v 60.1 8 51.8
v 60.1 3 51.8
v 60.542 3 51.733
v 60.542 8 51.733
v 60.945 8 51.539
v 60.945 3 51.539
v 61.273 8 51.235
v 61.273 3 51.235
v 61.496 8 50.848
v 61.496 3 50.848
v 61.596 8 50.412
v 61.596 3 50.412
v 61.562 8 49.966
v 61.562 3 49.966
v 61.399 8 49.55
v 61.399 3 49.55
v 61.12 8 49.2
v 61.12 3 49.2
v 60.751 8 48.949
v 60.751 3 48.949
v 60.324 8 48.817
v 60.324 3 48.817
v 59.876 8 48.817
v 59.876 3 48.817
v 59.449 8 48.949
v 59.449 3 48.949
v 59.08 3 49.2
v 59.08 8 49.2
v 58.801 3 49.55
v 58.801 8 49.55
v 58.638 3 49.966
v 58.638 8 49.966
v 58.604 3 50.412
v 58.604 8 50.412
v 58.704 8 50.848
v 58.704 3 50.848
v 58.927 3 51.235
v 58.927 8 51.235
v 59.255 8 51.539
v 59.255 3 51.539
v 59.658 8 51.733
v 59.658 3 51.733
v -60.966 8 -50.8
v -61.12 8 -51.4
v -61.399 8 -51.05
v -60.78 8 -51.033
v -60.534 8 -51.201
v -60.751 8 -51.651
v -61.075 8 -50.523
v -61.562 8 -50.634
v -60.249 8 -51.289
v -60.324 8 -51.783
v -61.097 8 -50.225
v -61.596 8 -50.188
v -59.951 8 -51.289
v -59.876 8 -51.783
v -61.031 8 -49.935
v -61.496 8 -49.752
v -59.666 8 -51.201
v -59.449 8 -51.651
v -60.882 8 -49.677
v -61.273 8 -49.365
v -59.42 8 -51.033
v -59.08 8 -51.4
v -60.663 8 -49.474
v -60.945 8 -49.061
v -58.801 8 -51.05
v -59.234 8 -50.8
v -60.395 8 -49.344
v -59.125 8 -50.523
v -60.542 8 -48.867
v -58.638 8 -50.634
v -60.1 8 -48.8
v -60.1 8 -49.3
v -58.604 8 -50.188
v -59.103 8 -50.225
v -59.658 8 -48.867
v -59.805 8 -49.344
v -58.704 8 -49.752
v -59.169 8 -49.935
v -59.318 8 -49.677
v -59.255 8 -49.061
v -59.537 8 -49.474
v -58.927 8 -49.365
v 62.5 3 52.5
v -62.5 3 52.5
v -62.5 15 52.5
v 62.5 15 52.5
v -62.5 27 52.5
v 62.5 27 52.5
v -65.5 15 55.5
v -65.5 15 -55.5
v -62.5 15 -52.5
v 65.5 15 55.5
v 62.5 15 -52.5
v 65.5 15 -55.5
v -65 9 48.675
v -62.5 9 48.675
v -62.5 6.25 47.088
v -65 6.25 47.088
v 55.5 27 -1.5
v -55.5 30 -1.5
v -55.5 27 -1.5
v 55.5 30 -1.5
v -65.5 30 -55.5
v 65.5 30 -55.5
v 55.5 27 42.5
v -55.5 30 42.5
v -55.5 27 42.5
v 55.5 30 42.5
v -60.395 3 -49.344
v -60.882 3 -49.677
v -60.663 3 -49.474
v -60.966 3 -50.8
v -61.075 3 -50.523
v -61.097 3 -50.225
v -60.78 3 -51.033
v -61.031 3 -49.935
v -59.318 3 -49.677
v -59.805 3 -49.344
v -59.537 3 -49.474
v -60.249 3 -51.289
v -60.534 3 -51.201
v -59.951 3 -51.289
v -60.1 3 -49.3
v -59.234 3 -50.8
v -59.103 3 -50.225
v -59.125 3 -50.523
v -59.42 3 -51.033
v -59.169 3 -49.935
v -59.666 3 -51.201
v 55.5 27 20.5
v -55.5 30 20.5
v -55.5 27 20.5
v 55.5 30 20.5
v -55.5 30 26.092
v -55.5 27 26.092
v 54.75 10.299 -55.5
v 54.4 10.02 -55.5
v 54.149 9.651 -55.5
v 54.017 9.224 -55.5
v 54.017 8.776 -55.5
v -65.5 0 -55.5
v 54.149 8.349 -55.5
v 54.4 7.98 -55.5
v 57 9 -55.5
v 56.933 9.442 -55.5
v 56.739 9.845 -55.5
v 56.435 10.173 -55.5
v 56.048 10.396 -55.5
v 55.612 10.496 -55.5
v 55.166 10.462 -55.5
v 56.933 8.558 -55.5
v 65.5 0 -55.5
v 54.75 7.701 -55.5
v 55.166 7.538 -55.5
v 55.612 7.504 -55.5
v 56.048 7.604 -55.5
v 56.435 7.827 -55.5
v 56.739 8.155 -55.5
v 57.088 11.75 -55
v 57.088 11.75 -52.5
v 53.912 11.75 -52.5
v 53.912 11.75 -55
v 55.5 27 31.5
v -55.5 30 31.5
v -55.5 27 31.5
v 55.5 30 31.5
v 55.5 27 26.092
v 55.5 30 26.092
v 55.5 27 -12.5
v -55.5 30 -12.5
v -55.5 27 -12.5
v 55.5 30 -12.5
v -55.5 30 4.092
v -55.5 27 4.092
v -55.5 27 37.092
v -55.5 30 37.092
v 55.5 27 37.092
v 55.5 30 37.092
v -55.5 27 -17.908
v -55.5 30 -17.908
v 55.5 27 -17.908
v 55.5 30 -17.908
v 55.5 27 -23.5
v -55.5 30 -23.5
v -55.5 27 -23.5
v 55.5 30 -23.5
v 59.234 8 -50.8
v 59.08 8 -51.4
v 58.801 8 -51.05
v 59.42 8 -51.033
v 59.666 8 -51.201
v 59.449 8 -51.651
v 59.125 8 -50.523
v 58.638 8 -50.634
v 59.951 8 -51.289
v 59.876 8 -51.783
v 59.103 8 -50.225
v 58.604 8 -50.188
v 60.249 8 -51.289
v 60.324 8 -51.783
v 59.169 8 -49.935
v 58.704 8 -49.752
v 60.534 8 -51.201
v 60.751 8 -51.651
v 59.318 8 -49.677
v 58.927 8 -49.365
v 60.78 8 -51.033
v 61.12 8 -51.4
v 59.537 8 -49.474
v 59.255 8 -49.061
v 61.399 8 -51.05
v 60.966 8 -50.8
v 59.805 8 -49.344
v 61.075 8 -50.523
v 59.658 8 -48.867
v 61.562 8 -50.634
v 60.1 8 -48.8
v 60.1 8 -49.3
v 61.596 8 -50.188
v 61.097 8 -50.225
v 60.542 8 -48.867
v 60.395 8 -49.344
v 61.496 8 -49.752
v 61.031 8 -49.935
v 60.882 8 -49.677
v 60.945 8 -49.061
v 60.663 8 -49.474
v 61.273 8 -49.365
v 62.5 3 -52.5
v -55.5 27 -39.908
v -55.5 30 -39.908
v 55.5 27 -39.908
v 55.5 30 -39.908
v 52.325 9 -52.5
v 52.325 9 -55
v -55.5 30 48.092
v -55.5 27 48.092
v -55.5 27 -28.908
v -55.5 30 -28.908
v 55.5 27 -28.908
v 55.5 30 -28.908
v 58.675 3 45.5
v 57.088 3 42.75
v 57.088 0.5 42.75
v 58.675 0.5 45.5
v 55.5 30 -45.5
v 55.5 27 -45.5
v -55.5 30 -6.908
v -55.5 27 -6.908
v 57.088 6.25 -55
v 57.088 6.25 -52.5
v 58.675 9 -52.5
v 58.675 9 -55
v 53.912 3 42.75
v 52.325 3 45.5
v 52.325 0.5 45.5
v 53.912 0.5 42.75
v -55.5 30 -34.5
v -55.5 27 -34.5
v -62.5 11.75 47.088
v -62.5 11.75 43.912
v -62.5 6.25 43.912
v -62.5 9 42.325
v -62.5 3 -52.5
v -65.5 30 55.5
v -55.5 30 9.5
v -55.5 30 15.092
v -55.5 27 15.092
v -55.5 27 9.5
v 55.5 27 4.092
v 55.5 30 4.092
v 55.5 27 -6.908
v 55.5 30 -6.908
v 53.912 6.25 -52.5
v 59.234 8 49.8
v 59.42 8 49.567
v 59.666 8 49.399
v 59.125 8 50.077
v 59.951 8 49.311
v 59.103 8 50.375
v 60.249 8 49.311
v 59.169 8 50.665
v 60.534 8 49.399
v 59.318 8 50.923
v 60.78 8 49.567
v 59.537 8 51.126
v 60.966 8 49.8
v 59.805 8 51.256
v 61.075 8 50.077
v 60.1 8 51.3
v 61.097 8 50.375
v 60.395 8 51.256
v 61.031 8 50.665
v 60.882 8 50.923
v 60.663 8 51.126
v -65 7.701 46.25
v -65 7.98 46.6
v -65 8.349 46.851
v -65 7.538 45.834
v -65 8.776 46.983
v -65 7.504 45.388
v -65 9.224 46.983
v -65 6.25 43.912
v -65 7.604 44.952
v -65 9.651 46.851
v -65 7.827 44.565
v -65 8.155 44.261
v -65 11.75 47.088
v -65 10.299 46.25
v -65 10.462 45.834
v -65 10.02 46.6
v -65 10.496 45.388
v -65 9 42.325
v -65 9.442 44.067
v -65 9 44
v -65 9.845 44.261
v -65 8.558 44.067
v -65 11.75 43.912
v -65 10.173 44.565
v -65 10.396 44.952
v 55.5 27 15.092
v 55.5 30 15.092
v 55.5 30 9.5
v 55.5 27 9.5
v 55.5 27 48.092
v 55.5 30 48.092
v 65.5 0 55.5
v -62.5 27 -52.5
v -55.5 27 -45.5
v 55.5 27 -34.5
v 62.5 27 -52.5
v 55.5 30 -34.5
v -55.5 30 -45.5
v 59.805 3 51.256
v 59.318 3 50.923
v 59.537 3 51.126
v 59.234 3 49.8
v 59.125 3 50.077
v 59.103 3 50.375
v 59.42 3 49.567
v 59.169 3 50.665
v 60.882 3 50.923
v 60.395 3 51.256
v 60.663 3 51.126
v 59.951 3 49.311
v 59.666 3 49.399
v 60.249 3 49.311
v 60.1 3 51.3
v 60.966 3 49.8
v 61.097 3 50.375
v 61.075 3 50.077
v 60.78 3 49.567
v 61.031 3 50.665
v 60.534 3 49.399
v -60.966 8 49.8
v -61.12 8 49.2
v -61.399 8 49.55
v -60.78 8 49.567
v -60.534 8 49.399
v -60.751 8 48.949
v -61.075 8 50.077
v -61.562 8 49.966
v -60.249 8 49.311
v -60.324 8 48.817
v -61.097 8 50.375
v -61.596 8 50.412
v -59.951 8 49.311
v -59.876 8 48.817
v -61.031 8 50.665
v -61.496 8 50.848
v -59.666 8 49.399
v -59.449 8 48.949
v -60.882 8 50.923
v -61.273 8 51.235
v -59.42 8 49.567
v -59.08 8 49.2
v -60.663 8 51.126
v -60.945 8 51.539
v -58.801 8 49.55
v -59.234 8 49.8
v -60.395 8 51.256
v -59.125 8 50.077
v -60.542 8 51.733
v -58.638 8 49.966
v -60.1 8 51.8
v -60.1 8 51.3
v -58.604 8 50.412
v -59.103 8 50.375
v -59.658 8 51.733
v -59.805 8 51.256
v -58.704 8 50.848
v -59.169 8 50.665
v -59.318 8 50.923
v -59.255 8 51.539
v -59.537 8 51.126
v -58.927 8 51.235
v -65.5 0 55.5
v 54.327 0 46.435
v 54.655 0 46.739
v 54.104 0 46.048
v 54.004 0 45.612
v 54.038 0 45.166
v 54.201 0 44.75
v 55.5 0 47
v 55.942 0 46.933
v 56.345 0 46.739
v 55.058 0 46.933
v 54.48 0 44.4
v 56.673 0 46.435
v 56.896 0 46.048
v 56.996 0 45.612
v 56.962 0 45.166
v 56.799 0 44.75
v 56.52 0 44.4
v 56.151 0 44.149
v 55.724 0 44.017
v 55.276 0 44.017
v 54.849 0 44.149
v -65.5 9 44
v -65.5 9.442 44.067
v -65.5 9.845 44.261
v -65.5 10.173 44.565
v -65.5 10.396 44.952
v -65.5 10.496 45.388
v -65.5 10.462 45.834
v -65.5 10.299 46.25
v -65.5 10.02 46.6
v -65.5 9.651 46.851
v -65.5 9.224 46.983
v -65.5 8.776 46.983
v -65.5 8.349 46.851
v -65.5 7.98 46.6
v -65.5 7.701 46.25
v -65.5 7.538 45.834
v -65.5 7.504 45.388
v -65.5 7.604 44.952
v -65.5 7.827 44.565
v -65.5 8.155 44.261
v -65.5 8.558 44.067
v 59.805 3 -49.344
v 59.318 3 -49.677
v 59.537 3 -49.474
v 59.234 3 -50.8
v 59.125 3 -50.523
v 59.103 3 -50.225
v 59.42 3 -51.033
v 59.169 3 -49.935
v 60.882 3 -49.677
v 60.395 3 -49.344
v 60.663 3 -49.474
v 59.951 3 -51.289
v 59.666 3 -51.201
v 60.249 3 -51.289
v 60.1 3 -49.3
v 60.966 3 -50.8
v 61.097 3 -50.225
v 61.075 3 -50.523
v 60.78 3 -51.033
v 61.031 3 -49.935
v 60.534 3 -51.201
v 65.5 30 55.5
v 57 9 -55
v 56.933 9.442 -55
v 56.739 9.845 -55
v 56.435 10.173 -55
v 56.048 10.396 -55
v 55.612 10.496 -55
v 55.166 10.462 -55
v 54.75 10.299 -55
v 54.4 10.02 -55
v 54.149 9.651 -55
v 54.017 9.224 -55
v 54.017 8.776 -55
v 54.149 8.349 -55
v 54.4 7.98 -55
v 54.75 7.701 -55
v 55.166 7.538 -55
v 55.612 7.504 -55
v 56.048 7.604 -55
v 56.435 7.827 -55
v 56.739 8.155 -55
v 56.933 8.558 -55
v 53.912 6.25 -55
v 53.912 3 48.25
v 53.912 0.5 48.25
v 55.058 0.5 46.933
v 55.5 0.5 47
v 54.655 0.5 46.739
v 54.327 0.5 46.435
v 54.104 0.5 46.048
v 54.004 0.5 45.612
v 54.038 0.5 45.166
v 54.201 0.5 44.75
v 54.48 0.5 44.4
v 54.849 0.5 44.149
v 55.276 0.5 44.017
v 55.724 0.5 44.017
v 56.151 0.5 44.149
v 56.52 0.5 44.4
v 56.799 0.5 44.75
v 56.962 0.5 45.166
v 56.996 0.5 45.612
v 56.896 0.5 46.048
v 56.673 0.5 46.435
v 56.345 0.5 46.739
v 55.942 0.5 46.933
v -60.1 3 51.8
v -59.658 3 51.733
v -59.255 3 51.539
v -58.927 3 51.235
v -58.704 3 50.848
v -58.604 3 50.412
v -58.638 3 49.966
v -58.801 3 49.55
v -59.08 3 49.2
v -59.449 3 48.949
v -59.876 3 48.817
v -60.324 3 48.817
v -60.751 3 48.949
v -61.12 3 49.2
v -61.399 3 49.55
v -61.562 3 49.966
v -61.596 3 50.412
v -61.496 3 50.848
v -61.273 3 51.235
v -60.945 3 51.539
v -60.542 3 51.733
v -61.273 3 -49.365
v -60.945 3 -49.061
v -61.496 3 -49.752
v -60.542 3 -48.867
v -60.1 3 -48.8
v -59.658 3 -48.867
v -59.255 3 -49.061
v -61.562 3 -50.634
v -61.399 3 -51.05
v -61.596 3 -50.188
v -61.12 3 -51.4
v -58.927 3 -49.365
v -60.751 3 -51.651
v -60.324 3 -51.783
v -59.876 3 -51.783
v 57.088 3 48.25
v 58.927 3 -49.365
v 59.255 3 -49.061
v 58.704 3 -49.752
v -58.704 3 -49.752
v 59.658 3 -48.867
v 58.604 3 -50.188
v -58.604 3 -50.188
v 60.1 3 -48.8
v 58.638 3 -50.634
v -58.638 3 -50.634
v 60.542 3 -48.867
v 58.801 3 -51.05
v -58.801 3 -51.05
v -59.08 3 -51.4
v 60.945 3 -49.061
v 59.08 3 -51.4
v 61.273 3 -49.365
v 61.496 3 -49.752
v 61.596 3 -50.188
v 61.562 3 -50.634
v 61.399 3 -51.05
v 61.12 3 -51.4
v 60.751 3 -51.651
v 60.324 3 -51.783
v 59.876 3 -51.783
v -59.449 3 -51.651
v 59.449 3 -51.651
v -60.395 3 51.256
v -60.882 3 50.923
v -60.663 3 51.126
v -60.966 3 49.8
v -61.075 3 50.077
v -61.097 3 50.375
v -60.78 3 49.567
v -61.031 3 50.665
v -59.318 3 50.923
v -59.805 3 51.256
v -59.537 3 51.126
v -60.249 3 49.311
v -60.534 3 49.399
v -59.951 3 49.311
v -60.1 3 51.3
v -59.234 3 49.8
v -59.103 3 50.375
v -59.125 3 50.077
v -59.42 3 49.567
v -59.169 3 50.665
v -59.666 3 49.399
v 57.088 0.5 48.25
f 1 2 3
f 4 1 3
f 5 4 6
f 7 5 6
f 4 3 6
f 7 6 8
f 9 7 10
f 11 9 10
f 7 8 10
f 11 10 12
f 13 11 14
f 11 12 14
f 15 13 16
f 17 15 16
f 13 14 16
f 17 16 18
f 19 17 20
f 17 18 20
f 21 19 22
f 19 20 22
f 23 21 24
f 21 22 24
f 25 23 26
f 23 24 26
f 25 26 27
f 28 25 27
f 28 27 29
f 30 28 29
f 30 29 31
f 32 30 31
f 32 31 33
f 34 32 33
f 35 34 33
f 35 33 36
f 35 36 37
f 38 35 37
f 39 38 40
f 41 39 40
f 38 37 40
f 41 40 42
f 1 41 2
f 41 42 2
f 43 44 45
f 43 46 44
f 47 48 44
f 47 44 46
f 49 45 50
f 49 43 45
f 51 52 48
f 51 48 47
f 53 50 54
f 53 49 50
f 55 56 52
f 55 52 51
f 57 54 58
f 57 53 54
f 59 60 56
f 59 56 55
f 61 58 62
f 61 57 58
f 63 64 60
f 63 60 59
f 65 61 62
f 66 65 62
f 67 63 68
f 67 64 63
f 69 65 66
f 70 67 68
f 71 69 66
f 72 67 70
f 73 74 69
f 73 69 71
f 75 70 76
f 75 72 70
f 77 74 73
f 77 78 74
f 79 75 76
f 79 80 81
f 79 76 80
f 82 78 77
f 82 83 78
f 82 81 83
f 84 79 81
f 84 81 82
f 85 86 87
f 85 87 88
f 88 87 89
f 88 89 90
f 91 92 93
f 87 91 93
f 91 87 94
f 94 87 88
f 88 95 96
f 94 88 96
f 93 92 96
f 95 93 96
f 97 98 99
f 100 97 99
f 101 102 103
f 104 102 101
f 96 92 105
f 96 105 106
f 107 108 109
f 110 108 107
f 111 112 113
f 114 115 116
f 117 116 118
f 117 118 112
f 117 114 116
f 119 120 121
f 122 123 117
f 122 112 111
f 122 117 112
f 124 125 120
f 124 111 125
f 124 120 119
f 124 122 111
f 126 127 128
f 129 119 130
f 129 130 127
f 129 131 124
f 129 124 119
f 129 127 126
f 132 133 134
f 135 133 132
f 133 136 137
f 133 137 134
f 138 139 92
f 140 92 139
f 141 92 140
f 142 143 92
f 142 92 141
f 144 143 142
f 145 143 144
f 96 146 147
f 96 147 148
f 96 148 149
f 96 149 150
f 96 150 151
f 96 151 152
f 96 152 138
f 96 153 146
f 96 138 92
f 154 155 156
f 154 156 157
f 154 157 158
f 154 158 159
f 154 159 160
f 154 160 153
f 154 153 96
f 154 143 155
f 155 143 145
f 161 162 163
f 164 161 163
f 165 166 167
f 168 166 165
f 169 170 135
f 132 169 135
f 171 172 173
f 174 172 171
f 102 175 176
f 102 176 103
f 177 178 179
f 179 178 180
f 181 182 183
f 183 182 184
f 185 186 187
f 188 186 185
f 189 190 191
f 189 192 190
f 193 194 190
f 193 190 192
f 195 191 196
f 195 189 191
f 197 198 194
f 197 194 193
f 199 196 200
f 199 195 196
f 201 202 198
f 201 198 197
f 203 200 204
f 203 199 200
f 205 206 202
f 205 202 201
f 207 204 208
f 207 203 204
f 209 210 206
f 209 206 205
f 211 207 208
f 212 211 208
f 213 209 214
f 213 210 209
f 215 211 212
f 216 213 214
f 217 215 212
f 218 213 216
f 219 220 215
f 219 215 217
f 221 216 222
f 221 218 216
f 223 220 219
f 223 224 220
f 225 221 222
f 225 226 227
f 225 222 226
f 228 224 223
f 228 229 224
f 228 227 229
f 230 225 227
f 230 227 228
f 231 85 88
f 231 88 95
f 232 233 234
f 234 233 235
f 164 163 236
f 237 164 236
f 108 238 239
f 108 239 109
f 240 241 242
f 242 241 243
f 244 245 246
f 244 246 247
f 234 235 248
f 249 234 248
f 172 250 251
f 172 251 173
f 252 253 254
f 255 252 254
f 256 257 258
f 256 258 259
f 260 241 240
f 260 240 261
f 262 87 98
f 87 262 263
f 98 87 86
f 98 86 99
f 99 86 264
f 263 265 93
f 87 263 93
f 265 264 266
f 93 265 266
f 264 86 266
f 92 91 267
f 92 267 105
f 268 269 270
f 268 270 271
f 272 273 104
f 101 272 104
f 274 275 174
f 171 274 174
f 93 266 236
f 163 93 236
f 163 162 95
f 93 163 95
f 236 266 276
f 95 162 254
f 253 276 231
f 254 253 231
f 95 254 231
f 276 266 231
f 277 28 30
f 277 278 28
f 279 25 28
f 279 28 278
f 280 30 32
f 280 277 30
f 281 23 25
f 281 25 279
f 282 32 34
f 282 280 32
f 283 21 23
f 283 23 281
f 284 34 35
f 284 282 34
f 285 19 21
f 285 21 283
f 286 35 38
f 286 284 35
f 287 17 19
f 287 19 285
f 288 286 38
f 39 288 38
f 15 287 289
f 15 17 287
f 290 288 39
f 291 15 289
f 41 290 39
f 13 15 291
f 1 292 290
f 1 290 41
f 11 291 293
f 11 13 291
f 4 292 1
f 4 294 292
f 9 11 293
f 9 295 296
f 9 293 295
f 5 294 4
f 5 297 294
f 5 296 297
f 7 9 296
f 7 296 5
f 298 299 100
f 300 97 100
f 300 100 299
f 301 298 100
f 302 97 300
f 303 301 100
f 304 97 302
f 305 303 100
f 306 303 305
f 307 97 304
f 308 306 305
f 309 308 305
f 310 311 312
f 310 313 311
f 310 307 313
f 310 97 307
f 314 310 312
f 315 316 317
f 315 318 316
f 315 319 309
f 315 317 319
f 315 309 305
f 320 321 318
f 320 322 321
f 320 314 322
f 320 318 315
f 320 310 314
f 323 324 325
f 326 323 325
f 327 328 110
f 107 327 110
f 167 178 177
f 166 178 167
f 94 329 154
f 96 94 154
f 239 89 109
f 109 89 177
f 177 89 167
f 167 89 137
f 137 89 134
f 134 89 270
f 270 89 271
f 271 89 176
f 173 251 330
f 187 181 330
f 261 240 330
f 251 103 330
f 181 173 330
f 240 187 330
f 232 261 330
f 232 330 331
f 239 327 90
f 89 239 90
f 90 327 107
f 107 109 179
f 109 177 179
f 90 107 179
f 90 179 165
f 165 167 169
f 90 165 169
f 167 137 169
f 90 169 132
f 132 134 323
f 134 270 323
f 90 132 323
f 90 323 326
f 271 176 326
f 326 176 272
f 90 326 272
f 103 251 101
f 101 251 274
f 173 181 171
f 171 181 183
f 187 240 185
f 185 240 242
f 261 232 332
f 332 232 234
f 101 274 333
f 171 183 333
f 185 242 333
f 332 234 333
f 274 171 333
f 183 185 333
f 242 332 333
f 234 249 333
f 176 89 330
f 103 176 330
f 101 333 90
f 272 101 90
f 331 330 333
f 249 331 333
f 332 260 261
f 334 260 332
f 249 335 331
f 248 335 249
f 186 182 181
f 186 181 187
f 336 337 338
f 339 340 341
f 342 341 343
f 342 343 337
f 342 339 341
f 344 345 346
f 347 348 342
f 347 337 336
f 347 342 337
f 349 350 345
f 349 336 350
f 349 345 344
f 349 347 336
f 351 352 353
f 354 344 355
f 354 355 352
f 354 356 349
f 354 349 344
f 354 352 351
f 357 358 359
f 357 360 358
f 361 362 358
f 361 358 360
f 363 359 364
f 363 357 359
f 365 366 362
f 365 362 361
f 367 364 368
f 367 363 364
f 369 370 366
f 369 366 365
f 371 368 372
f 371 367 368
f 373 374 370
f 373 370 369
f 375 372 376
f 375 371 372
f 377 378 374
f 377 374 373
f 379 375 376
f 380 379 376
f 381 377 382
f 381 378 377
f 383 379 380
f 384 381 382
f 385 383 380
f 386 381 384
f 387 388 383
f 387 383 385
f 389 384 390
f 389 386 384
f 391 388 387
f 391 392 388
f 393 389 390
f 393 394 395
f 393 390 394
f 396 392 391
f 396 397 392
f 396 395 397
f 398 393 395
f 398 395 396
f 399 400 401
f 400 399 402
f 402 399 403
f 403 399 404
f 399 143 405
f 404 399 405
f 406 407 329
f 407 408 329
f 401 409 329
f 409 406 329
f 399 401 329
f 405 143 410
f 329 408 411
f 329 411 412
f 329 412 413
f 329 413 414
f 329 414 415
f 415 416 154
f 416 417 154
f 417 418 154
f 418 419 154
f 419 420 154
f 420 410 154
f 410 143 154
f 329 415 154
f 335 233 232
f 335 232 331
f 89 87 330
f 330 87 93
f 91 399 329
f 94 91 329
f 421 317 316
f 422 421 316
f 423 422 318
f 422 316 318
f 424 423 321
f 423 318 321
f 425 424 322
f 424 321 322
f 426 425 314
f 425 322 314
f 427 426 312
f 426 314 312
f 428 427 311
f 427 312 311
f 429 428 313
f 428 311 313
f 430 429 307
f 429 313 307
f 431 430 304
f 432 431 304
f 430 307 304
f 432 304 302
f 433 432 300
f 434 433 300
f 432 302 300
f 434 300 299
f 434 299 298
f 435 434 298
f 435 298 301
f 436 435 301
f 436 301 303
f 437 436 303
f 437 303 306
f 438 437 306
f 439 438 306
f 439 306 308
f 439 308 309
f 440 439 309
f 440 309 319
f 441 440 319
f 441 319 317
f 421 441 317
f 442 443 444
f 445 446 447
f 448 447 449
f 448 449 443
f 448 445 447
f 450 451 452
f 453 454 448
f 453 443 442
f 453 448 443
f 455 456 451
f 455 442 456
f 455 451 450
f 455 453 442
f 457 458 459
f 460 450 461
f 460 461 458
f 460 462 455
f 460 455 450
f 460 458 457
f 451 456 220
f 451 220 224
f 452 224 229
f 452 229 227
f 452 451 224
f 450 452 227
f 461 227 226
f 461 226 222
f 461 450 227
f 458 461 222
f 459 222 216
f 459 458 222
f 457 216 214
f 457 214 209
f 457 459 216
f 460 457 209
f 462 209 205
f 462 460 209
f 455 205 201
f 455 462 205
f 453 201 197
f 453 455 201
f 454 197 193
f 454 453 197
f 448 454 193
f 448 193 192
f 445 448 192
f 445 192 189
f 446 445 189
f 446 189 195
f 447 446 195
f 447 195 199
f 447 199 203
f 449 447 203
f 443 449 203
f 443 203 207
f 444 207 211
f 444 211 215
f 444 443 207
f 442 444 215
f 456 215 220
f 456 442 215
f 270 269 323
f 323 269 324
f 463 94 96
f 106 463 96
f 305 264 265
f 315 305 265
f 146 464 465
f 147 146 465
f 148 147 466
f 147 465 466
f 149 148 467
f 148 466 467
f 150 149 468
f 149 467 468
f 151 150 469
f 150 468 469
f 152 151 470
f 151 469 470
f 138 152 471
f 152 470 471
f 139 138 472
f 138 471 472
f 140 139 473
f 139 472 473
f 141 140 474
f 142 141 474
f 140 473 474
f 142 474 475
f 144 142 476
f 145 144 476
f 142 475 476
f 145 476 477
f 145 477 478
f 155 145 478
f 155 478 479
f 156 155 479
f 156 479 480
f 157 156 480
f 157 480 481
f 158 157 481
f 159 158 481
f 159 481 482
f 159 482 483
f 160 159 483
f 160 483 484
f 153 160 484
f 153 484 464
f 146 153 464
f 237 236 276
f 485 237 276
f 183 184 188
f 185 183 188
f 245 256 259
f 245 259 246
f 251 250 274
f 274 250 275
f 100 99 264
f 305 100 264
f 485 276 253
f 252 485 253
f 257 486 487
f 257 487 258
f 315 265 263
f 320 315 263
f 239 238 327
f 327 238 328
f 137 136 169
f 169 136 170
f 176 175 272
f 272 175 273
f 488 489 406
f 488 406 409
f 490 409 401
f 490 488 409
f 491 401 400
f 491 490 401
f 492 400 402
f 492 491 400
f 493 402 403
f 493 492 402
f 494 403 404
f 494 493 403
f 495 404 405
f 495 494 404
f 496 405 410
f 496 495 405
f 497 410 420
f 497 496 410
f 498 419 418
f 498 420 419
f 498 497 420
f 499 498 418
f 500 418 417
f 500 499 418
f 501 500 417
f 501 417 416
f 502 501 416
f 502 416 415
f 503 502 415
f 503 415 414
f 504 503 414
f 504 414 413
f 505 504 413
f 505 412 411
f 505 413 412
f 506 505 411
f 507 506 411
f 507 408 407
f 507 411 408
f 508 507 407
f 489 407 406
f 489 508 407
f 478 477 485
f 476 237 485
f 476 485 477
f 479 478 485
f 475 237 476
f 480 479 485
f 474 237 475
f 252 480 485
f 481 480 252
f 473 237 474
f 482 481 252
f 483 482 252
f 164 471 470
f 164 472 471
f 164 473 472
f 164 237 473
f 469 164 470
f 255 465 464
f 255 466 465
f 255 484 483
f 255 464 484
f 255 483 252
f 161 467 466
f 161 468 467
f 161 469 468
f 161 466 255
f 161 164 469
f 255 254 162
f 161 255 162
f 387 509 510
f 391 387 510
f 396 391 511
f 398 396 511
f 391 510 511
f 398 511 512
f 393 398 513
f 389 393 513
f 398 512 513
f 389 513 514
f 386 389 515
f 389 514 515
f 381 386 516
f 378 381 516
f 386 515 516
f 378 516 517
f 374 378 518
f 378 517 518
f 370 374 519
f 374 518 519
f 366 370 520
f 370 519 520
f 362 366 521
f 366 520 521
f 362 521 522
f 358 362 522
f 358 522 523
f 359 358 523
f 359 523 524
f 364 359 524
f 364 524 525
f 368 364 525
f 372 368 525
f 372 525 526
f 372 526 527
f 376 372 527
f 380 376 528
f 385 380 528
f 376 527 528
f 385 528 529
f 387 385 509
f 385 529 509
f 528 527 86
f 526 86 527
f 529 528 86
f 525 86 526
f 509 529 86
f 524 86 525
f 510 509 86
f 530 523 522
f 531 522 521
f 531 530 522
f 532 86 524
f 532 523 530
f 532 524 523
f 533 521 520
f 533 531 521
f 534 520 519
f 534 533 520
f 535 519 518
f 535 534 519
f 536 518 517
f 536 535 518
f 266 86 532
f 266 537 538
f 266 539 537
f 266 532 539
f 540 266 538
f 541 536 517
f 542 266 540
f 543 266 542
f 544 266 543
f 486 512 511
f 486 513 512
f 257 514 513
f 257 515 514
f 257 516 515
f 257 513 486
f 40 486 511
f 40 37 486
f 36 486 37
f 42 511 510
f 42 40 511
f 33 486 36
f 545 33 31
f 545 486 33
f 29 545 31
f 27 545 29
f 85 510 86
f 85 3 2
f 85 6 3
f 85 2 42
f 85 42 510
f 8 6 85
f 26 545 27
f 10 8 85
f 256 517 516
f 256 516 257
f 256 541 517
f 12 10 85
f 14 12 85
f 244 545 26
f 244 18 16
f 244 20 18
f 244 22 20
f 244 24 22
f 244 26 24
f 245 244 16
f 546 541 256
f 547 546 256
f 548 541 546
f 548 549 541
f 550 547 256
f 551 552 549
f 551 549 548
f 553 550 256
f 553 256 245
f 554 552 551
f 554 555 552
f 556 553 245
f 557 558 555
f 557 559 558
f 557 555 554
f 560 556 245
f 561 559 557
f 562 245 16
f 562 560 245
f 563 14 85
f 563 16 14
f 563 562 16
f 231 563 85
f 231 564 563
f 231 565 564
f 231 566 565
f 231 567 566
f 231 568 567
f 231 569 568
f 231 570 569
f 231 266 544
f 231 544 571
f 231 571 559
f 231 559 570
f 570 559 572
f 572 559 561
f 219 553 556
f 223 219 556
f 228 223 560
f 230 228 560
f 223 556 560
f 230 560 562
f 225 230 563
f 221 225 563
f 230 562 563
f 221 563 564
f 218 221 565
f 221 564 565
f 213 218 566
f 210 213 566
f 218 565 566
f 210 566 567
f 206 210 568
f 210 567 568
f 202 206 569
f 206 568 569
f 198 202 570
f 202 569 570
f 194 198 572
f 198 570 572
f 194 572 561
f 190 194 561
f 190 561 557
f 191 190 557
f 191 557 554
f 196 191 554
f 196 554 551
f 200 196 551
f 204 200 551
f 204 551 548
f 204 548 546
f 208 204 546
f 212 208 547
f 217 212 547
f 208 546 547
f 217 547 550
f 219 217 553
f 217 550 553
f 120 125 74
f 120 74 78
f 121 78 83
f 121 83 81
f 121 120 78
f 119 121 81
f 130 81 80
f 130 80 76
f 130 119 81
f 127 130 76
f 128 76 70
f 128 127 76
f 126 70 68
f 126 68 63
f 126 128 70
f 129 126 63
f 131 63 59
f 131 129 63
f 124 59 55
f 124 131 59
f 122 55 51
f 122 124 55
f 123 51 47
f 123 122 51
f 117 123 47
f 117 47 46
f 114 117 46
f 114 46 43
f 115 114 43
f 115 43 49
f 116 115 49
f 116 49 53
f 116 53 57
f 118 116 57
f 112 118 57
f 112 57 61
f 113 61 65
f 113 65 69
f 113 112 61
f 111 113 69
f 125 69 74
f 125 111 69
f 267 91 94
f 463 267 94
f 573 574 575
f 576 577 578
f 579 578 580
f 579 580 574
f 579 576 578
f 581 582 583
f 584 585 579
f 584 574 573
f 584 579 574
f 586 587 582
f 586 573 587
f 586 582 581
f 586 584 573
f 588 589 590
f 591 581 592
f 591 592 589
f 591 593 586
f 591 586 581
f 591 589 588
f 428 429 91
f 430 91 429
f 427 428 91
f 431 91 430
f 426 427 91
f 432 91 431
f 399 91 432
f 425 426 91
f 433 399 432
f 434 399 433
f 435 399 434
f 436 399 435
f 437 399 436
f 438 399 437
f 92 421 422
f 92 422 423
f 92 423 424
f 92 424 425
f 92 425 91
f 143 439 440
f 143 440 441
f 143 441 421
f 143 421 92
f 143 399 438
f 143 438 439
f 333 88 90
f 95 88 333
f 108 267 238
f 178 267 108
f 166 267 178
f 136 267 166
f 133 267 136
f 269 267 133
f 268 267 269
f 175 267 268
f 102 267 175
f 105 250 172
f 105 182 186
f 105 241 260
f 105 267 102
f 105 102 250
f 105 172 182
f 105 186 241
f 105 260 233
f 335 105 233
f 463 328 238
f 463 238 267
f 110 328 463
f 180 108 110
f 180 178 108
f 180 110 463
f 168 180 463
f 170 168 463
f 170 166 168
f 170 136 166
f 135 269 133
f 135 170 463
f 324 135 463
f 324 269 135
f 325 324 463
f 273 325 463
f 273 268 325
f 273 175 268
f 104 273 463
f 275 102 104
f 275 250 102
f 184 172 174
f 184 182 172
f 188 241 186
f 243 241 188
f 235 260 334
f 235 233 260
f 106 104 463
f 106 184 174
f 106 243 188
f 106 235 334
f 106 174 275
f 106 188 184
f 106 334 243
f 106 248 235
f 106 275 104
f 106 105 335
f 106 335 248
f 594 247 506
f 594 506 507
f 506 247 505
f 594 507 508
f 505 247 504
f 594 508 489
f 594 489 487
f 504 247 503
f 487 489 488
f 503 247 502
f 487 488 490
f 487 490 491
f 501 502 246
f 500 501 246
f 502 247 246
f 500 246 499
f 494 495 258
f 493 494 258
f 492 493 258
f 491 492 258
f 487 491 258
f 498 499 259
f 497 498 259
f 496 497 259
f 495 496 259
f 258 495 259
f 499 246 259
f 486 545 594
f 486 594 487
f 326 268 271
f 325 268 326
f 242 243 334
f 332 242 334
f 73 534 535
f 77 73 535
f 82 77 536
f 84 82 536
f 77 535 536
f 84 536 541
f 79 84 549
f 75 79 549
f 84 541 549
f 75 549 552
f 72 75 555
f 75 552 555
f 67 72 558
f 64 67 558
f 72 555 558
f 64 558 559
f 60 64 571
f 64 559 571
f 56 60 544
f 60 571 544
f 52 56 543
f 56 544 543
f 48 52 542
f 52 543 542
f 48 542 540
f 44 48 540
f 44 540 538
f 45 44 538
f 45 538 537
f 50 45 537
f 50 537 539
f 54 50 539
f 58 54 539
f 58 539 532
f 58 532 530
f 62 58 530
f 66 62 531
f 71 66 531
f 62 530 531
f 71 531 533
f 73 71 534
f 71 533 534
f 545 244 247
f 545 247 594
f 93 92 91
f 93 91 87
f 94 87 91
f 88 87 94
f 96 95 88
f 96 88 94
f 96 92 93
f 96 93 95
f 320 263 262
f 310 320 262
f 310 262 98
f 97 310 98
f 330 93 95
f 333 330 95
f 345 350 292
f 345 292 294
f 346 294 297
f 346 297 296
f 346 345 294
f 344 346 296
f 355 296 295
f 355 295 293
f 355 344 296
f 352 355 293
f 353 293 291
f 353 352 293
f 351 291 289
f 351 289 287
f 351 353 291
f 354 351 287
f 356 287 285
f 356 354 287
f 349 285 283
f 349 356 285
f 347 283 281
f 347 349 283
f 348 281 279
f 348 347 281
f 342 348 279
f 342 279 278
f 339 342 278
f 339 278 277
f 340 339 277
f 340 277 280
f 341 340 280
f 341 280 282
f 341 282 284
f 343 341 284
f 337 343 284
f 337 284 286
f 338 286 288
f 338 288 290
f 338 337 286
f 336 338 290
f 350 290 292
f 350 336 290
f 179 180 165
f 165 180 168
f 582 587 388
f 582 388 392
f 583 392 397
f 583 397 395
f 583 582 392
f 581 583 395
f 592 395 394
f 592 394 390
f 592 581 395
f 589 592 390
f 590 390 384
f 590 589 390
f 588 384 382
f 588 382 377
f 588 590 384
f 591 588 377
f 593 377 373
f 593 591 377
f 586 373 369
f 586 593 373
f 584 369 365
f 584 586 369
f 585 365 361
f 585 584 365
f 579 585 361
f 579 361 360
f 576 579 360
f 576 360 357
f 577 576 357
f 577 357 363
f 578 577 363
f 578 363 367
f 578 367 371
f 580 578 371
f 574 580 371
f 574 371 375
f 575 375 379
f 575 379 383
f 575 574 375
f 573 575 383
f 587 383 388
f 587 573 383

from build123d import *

# Parameters (mm, degrees)
ESBO_O1_W                    = 131
ESBO_O1_H                    = 111
ESBO_O1_W_2                  = 125
ESBO_O1_H_2                  = 105
RESSALTO_EXTRUS_O1_DEPTH     = 15
ESBO_O1_4_W                  = 125
ESBO_O1_4_H                  = 105
RESSALTO_EXTRUS_O4_DEPTH     = 3
ESBO_O2_R                    = 1.5
ESBO_O2_R_2                  = 1
RESSALTO_EXTRUS_O8_DEPTH     = 5
CORTE_EXTRUS_O4_DEPTH        = 2.5
CORTE_EXTRUS_O5_REACH        = 142.318
ESBO_O5_5_R                  = 1.5
CORTE_EXTRUS_O6_DEPTH        = 2.5
CORTE_EXTRUS_O7_REACH        = 129.198
ESBO_O8_7_R                  = 1.5
CORTE_EXTRUS_O9_DEPTH        = 2.5
CORTE_EXTRUS_O10_REACH       = 88.686
ESBO_O9_7_R                  = 1.5
RESSALTO_EXTRUS_O6_START     = 15
ESBO_O1_6_W                  = 131
ESBO_O1_6_H                  = 111
ESBO_O1_6_W_2                = 125
ESBO_O1_6_H_2                = 105
RESSALTO_EXTRUS_O6_DEPTH     = 15
RESSALTO_EXTRUS_O7_START     = 27
RESSALTO_EXTRUS_O7_OUTLINE_W = 125
RESSALTO_EXTRUS_O7_OUTLINE_H = 105
RESSALTO_EXTRUS_O7_DEPTH     = 3
ESBO_O3_W                    = 111
ESBO_O3_H                    = 5.592085676
CORTE_EXTRUS_O1_DEPTH        = 3


# Read off the part's stored shape, not the designer's step: Ressalto-extrusão7
with BuildPart() as part:
    # Esboço1 → Ressalto-extrusão1 (new body)
    with BuildSketch(Plane(origin=(0, 0, 0), x_dir=(1, 0, 0), z_dir=(0, 1, 0))):
        Rectangle(ESBO_O1_W, ESBO_O1_H)
        Rectangle(ESBO_O1_W_2, ESBO_O1_H_2, mode=Mode.SUBTRACT)
    extrude(amount=RESSALTO_EXTRUS_O1_DEPTH)

    # Esboço1<4> → Ressalto-extrusão4 (add)
    with BuildSketch(Plane(origin=(0, 0, 0), x_dir=(1, 0, 0), z_dir=(0, 1, 0))):
        Rectangle(ESBO_O1_4_W, ESBO_O1_4_H)
    extrude(amount=RESSALTO_EXTRUS_O4_DEPTH)

    # Esboço2 → Ressalto-extrusão8 (add)
    # profile 1 of 4: a face of its own
    with BuildSketch(Plane(origin=(0, 3, 0), x_dir=(1, 0, 0), z_dir=(0, 1, 0))):
        with Locations(Location((-60.1, 50.3, 0), (0, 0, 270))):
            Circle(ESBO_O2_R)
        with Locations(Location((-60.1, 50.3, 0), (0, 0, 270))):
            Circle(ESBO_O2_R_2, mode=Mode.SUBTRACT)
    # profile 2 of 4: a face of its own
    with BuildSketch(Plane(origin=(0, 3, 0), x_dir=(1, 0, 0), z_dir=(0, 1, 0))):
        with Locations(Location((60.1, 50.3, 0), (0, 0, 270))):
            Circle(ESBO_O2_R)
        with Locations(Location((60.1, 50.3, 0), (0, 0, 270))):
            Circle(ESBO_O2_R_2, mode=Mode.SUBTRACT)
    # profile 3 of 4: a face of its own
    with BuildSketch(Plane(origin=(0, 3, 0), x_dir=(1, 0, 0), z_dir=(0, 1, 0))):
        with Locations(Location((-60.1, -50.3, 0), (0, 0, 270))):
            Circle(ESBO_O2_R)
        with Locations(Location((-60.1, -50.3, 0), (0, 0, 270))):
            Circle(ESBO_O2_R_2, mode=Mode.SUBTRACT)
    # profile 4 of 4: a face of its own
    with BuildSketch(Plane(origin=(0, 3, 0), x_dir=(1, 0, 0), z_dir=(0, 1, 0))):
        with Locations(Location((60.1, -50.3, 0), (0, 0, 270))):
            Circle(ESBO_O2_R)
        with Locations(Location((60.1, -50.3, 0), (0, 0, 270))):
            Circle(ESBO_O2_R_2, mode=Mode.SUBTRACT)
    extrude(amount=RESSALTO_EXTRUS_O8_DEPTH)

    # Esboço5 → Corte-extrusão4 (cut)
    with BuildSketch(Plane(origin=(-62.5, 0, 0), x_dir=(0, 0, -1), z_dir=(1, 0, 0))):
        Polygon((-43.91228676, 6.25), (-42.324573519, 9), (-43.91228676, 11.75), (-47.08771324, 11.75), (-48.675426481, 9), (-47.08771324, 6.25), align=None)
    extrude(amount=-CORTE_EXTRUS_O4_DEPTH, mode=Mode.SUBTRACT)

    # Esboço5<5> → Corte-extrusão5 (cut, up to next)
    with BuildSketch(Plane(origin=(-62.5, 0, 0), x_dir=(0, 0, -1), z_dir=(1, 0, 0)), mode=Mode.PRIVATE) as corte_extrus_o5_sk1:
        with Locations((-45.5, 9)):
            Circle(ESBO_O5_5_R)
    corte_extrus_o5_tool1 = extrude(corte_extrus_o5_sk1.sketch, amount=-CORTE_EXTRUS_O5_REACH, mode=Mode.PRIVATE) & part.part
    add(corte_extrus_o5_tool1.solids().sort_by_distance((-62.5, 9, 45.5))[0], mode=Mode.SUBTRACT)

    # Esboço8 → Corte-extrusão6 (cut)
    with BuildSketch(Plane.XY.offset(-52.5)):
        Polygon((57.08771324, 6.25), (58.675426481, 9), (57.08771324, 11.75), (53.91228676, 11.75), (52.324573519, 9), (53.91228676, 6.25), align=None)
    extrude(amount=-CORTE_EXTRUS_O6_DEPTH, mode=Mode.SUBTRACT)

    # Esboço8<7> → Corte-extrusão7 (cut, up to next)
    with BuildSketch(Plane.XY.offset(-52.5), mode=Mode.PRIVATE) as corte_extrus_o7_sk1:
        with Locations((55.5, 9)):
            Circle(ESBO_O8_7_R)
    corte_extrus_o7_tool1 = extrude(corte_extrus_o7_sk1.sketch, amount=-CORTE_EXTRUS_O7_REACH, mode=Mode.PRIVATE) & part.part
    add(corte_extrus_o7_tool1.solids().sort_by_distance((55.5, 9, -52.5))[0], mode=Mode.SUBTRACT)

    # Esboço9 → Corte-extrusão9 (cut)
    with BuildSketch(Plane(origin=(0, 3, 0), x_dir=(-1, 0, 0), z_dir=(0, -1, 0))):
        Polygon((-53.91228676, -48.25), (-52.324573519, -45.5), (-53.91228676, -42.75), (-57.08771324, -42.75), (-58.675426481, -45.5), (-57.08771324, -48.25), align=None)
    extrude(amount=CORTE_EXTRUS_O9_DEPTH, mode=Mode.SUBTRACT)

    # Esboço9<7> → Corte-extrusão10 (cut, up to next)
    with BuildSketch(Plane(origin=(0, 3, 0), x_dir=(-1, 0, 0), z_dir=(0, -1, 0)), mode=Mode.PRIVATE) as corte_extrus_o10_sk1:
        with Locations(Location((-55.5, -45.5, 0), (0, 0, 270))):
            Circle(ESBO_O9_7_R)
    corte_extrus_o10_tool1 = extrude(corte_extrus_o10_sk1.sketch, amount=CORTE_EXTRUS_O10_REACH, mode=Mode.PRIVATE) & part.part
    add(corte_extrus_o10_tool1.solids().sort_by_distance((55.5, 3, 45.5))[0], mode=Mode.SUBTRACT)


with BuildPart() as body_2:
    # Esboço1<6> → Ressalto-extrusão6 (new body)
    with BuildSketch(Plane(origin=(0, 0, 0), x_dir=(1, 0, 0), z_dir=(0, 1, 0)).offset(RESSALTO_EXTRUS_O6_START)):
        Rectangle(ESBO_O1_6_W, ESBO_O1_6_H)
        Rectangle(ESBO_O1_6_W_2, ESBO_O1_6_H_2, mode=Mode.SUBTRACT)
    extrude(amount=RESSALTO_EXTRUS_O6_DEPTH)

    # Ressalto-extrusão7 outline → Ressalto-extrusão7 (add)
    with BuildSketch(Plane(origin=(0, 0, 0), x_dir=(1, 0, 0), z_dir=(0, 1, 0)).offset(RESSALTO_EXTRUS_O7_START)):
        Rectangle(RESSALTO_EXTRUS_O7_OUTLINE_W, RESSALTO_EXTRUS_O7_OUTLINE_H)
    extrude(amount=RESSALTO_EXTRUS_O7_DEPTH)

    # Esboço3 → Corte-extrusão1 (cut)
    with BuildSketch(Plane(origin=(0, 30, 0), x_dir=(1, 0, 0), z_dir=(0, 1, 0))):
        with Locations((0, 42.703957162)):
            Rectangle(ESBO_O3_W, ESBO_O3_H)
        with Locations((0, 31.703957162)):
            Rectangle(ESBO_O3_W, ESBO_O3_H)
        with Locations((0, 20.703957162)):
            Rectangle(ESBO_O3_W, ESBO_O3_H)
        with Locations((0, 9.703957162)):
            Rectangle(ESBO_O3_W, ESBO_O3_H)
        with Locations((0, -1.296042838)):
            Rectangle(ESBO_O3_W, ESBO_O3_H)
        with Locations((0, -12.296042838)):
            Rectangle(ESBO_O3_W, ESBO_O3_H)
        with Locations((0, -23.296042838)):
            Rectangle(ESBO_O3_W, ESBO_O3_H)
        with Locations((0, -34.296042838)):
            Rectangle(ESBO_O3_W, ESBO_O3_H)
        with Locations((0, -45.296042838)):
            Rectangle(ESBO_O3_W, ESBO_O3_H)
    extrude(amount=-CORTE_EXTRUS_O1_DEPTH, mode=Mode.SUBTRACT)


solid = Compound([part.part, body_2.part])
